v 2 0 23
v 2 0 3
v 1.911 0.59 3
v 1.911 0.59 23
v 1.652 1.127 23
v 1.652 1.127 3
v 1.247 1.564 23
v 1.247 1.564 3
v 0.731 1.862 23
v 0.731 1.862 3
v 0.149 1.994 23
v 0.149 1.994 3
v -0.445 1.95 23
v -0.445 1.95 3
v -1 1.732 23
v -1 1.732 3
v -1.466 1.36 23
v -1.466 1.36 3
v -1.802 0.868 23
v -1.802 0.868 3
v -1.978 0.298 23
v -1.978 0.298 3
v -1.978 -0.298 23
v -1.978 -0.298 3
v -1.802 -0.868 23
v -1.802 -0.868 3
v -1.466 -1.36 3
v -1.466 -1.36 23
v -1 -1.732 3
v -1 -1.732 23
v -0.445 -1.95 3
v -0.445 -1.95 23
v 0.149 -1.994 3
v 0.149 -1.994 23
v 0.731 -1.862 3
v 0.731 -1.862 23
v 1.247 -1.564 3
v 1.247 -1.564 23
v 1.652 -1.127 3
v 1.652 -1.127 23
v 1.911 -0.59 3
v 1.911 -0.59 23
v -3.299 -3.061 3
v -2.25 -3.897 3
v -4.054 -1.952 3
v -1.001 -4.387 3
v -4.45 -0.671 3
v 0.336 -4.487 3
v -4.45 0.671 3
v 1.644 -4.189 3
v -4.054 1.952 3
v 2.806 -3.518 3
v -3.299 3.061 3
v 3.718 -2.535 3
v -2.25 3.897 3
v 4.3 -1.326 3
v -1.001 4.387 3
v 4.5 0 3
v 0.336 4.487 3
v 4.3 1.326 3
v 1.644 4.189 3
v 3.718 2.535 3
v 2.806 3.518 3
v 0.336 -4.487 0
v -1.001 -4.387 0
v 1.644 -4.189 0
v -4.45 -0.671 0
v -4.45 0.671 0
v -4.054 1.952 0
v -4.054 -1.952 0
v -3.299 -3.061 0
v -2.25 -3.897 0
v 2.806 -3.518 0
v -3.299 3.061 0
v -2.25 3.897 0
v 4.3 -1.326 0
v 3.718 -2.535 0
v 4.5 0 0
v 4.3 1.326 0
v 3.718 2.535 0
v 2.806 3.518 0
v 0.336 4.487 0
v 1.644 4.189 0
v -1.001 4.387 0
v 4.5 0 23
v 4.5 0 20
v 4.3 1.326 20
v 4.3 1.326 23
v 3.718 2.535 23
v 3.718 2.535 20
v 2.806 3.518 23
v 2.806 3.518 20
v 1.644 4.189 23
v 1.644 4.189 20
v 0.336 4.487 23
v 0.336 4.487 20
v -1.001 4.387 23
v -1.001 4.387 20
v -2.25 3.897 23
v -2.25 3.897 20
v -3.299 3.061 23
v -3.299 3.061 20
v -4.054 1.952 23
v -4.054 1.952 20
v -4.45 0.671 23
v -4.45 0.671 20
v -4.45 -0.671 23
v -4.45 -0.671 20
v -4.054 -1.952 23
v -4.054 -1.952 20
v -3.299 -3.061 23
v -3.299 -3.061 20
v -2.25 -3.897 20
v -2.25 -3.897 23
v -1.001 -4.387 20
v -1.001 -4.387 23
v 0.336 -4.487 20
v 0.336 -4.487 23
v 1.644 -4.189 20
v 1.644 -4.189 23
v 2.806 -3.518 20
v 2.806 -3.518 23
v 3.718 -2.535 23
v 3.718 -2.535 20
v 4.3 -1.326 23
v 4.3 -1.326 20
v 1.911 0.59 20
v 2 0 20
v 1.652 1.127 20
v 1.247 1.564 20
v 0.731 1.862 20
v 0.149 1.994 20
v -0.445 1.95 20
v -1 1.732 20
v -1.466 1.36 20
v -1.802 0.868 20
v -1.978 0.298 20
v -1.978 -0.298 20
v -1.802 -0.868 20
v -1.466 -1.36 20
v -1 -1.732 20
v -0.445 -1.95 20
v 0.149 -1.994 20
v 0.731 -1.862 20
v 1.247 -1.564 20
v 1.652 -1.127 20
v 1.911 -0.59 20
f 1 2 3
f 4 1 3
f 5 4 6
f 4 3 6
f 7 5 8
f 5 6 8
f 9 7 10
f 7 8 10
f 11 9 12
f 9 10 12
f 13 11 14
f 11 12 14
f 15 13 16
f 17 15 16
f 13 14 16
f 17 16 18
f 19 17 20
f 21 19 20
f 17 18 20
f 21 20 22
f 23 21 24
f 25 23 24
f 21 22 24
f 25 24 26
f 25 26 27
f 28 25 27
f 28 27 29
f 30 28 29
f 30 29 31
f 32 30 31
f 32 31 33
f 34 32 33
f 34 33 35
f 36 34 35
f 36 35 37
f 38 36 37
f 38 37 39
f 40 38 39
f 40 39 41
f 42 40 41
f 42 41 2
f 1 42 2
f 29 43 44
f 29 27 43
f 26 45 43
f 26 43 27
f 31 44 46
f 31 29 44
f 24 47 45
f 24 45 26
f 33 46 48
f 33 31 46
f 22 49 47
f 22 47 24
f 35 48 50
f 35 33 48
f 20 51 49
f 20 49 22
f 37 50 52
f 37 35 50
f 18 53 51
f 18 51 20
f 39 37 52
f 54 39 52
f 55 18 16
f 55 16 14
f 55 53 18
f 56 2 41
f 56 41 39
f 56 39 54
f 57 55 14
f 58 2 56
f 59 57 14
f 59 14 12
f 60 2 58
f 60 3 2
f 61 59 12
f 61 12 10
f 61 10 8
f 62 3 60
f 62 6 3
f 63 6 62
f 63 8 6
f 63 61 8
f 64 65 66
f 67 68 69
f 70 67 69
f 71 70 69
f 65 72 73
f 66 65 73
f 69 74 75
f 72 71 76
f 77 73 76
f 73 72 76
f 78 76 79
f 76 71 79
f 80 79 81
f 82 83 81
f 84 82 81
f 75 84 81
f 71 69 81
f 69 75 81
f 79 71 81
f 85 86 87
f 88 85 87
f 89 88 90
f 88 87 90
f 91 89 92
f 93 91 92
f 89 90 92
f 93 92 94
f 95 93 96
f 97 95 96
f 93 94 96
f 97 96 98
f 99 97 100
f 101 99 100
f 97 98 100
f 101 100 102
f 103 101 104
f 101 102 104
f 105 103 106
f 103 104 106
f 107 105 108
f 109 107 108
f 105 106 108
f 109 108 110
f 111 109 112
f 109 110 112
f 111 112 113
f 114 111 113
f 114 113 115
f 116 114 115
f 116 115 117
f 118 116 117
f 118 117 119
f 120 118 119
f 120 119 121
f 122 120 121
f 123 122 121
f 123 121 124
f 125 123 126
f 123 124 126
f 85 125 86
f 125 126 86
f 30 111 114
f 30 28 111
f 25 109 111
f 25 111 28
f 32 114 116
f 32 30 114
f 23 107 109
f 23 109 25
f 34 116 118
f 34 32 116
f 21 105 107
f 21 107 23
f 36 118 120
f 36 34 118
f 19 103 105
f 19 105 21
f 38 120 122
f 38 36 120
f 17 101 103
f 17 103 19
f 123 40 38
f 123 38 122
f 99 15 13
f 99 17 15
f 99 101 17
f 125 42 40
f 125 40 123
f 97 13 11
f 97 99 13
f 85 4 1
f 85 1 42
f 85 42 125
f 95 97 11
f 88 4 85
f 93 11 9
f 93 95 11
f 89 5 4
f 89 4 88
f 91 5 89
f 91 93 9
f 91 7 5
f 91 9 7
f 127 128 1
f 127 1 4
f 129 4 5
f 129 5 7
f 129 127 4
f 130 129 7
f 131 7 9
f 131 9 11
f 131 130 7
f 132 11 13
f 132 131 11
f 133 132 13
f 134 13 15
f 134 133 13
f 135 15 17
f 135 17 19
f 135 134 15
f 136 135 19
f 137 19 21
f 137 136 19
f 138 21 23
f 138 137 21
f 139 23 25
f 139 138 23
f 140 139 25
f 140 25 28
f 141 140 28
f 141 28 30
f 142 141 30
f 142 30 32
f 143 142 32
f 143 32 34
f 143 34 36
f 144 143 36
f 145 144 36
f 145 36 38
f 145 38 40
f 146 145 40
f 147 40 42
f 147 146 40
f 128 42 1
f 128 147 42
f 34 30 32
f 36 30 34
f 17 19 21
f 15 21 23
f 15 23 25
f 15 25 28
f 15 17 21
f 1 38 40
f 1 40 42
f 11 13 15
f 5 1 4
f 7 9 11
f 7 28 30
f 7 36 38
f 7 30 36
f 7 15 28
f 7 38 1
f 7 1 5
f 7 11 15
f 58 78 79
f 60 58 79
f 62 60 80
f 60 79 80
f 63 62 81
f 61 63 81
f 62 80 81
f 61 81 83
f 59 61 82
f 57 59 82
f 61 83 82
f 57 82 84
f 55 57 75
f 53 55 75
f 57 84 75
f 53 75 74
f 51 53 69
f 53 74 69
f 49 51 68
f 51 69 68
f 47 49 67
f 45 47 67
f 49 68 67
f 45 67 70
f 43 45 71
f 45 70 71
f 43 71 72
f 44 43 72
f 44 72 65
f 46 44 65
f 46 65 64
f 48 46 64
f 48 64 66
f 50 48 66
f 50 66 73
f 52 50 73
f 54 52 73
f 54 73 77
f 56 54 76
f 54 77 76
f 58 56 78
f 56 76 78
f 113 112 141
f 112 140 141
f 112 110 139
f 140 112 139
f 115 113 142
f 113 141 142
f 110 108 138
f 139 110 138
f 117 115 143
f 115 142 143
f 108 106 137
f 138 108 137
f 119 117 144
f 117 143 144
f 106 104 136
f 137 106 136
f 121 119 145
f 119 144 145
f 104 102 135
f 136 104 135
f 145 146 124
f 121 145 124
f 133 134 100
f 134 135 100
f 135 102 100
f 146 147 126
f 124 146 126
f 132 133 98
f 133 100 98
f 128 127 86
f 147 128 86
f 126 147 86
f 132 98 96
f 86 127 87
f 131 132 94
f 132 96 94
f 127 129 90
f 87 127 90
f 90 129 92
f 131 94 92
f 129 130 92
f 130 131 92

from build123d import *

# Parameters (mm, degrees)
CROQUIS1_R              = 4.5
SALIENTE_EXTRUIR1_DEPTH = 3
CROQUIS2_R              = 2
SALIENTE_EXTRUIR2_DEPTH = 23
SALIENTE_EXTRUIR3_START = 20
CROQUIS4_R              = 4.5
CROQUIS4_R_2            = 2
SALIENTE_EXTRUIR3_DEPTH = 3


with BuildPart() as part:
    # Croquis1 → Saliente-Extruir1 (new body)
    with BuildSketch(Plane.XY):
        Circle(CROQUIS1_R)
    extrude(amount=SALIENTE_EXTRUIR1_DEPTH)

    # Croquis2 → Saliente-Extruir2 (add)
    with BuildSketch(Plane.XY):
        Circle(CROQUIS2_R)
    extrude(amount=SALIENTE_EXTRUIR2_DEPTH)


with BuildPart() as body_2:
    # Croquis4 → Saliente-Extruir3 (new body)
    with BuildSketch(Plane.XY.offset(SALIENTE_EXTRUIR3_START)):
        Circle(CROQUIS4_R)
        Circle(CROQUIS4_R_2, mode=Mode.SUBTRACT)
    extrude(amount=SALIENTE_EXTRUIR3_DEPTH)


solid = Compound([part.part, body_2.part])
